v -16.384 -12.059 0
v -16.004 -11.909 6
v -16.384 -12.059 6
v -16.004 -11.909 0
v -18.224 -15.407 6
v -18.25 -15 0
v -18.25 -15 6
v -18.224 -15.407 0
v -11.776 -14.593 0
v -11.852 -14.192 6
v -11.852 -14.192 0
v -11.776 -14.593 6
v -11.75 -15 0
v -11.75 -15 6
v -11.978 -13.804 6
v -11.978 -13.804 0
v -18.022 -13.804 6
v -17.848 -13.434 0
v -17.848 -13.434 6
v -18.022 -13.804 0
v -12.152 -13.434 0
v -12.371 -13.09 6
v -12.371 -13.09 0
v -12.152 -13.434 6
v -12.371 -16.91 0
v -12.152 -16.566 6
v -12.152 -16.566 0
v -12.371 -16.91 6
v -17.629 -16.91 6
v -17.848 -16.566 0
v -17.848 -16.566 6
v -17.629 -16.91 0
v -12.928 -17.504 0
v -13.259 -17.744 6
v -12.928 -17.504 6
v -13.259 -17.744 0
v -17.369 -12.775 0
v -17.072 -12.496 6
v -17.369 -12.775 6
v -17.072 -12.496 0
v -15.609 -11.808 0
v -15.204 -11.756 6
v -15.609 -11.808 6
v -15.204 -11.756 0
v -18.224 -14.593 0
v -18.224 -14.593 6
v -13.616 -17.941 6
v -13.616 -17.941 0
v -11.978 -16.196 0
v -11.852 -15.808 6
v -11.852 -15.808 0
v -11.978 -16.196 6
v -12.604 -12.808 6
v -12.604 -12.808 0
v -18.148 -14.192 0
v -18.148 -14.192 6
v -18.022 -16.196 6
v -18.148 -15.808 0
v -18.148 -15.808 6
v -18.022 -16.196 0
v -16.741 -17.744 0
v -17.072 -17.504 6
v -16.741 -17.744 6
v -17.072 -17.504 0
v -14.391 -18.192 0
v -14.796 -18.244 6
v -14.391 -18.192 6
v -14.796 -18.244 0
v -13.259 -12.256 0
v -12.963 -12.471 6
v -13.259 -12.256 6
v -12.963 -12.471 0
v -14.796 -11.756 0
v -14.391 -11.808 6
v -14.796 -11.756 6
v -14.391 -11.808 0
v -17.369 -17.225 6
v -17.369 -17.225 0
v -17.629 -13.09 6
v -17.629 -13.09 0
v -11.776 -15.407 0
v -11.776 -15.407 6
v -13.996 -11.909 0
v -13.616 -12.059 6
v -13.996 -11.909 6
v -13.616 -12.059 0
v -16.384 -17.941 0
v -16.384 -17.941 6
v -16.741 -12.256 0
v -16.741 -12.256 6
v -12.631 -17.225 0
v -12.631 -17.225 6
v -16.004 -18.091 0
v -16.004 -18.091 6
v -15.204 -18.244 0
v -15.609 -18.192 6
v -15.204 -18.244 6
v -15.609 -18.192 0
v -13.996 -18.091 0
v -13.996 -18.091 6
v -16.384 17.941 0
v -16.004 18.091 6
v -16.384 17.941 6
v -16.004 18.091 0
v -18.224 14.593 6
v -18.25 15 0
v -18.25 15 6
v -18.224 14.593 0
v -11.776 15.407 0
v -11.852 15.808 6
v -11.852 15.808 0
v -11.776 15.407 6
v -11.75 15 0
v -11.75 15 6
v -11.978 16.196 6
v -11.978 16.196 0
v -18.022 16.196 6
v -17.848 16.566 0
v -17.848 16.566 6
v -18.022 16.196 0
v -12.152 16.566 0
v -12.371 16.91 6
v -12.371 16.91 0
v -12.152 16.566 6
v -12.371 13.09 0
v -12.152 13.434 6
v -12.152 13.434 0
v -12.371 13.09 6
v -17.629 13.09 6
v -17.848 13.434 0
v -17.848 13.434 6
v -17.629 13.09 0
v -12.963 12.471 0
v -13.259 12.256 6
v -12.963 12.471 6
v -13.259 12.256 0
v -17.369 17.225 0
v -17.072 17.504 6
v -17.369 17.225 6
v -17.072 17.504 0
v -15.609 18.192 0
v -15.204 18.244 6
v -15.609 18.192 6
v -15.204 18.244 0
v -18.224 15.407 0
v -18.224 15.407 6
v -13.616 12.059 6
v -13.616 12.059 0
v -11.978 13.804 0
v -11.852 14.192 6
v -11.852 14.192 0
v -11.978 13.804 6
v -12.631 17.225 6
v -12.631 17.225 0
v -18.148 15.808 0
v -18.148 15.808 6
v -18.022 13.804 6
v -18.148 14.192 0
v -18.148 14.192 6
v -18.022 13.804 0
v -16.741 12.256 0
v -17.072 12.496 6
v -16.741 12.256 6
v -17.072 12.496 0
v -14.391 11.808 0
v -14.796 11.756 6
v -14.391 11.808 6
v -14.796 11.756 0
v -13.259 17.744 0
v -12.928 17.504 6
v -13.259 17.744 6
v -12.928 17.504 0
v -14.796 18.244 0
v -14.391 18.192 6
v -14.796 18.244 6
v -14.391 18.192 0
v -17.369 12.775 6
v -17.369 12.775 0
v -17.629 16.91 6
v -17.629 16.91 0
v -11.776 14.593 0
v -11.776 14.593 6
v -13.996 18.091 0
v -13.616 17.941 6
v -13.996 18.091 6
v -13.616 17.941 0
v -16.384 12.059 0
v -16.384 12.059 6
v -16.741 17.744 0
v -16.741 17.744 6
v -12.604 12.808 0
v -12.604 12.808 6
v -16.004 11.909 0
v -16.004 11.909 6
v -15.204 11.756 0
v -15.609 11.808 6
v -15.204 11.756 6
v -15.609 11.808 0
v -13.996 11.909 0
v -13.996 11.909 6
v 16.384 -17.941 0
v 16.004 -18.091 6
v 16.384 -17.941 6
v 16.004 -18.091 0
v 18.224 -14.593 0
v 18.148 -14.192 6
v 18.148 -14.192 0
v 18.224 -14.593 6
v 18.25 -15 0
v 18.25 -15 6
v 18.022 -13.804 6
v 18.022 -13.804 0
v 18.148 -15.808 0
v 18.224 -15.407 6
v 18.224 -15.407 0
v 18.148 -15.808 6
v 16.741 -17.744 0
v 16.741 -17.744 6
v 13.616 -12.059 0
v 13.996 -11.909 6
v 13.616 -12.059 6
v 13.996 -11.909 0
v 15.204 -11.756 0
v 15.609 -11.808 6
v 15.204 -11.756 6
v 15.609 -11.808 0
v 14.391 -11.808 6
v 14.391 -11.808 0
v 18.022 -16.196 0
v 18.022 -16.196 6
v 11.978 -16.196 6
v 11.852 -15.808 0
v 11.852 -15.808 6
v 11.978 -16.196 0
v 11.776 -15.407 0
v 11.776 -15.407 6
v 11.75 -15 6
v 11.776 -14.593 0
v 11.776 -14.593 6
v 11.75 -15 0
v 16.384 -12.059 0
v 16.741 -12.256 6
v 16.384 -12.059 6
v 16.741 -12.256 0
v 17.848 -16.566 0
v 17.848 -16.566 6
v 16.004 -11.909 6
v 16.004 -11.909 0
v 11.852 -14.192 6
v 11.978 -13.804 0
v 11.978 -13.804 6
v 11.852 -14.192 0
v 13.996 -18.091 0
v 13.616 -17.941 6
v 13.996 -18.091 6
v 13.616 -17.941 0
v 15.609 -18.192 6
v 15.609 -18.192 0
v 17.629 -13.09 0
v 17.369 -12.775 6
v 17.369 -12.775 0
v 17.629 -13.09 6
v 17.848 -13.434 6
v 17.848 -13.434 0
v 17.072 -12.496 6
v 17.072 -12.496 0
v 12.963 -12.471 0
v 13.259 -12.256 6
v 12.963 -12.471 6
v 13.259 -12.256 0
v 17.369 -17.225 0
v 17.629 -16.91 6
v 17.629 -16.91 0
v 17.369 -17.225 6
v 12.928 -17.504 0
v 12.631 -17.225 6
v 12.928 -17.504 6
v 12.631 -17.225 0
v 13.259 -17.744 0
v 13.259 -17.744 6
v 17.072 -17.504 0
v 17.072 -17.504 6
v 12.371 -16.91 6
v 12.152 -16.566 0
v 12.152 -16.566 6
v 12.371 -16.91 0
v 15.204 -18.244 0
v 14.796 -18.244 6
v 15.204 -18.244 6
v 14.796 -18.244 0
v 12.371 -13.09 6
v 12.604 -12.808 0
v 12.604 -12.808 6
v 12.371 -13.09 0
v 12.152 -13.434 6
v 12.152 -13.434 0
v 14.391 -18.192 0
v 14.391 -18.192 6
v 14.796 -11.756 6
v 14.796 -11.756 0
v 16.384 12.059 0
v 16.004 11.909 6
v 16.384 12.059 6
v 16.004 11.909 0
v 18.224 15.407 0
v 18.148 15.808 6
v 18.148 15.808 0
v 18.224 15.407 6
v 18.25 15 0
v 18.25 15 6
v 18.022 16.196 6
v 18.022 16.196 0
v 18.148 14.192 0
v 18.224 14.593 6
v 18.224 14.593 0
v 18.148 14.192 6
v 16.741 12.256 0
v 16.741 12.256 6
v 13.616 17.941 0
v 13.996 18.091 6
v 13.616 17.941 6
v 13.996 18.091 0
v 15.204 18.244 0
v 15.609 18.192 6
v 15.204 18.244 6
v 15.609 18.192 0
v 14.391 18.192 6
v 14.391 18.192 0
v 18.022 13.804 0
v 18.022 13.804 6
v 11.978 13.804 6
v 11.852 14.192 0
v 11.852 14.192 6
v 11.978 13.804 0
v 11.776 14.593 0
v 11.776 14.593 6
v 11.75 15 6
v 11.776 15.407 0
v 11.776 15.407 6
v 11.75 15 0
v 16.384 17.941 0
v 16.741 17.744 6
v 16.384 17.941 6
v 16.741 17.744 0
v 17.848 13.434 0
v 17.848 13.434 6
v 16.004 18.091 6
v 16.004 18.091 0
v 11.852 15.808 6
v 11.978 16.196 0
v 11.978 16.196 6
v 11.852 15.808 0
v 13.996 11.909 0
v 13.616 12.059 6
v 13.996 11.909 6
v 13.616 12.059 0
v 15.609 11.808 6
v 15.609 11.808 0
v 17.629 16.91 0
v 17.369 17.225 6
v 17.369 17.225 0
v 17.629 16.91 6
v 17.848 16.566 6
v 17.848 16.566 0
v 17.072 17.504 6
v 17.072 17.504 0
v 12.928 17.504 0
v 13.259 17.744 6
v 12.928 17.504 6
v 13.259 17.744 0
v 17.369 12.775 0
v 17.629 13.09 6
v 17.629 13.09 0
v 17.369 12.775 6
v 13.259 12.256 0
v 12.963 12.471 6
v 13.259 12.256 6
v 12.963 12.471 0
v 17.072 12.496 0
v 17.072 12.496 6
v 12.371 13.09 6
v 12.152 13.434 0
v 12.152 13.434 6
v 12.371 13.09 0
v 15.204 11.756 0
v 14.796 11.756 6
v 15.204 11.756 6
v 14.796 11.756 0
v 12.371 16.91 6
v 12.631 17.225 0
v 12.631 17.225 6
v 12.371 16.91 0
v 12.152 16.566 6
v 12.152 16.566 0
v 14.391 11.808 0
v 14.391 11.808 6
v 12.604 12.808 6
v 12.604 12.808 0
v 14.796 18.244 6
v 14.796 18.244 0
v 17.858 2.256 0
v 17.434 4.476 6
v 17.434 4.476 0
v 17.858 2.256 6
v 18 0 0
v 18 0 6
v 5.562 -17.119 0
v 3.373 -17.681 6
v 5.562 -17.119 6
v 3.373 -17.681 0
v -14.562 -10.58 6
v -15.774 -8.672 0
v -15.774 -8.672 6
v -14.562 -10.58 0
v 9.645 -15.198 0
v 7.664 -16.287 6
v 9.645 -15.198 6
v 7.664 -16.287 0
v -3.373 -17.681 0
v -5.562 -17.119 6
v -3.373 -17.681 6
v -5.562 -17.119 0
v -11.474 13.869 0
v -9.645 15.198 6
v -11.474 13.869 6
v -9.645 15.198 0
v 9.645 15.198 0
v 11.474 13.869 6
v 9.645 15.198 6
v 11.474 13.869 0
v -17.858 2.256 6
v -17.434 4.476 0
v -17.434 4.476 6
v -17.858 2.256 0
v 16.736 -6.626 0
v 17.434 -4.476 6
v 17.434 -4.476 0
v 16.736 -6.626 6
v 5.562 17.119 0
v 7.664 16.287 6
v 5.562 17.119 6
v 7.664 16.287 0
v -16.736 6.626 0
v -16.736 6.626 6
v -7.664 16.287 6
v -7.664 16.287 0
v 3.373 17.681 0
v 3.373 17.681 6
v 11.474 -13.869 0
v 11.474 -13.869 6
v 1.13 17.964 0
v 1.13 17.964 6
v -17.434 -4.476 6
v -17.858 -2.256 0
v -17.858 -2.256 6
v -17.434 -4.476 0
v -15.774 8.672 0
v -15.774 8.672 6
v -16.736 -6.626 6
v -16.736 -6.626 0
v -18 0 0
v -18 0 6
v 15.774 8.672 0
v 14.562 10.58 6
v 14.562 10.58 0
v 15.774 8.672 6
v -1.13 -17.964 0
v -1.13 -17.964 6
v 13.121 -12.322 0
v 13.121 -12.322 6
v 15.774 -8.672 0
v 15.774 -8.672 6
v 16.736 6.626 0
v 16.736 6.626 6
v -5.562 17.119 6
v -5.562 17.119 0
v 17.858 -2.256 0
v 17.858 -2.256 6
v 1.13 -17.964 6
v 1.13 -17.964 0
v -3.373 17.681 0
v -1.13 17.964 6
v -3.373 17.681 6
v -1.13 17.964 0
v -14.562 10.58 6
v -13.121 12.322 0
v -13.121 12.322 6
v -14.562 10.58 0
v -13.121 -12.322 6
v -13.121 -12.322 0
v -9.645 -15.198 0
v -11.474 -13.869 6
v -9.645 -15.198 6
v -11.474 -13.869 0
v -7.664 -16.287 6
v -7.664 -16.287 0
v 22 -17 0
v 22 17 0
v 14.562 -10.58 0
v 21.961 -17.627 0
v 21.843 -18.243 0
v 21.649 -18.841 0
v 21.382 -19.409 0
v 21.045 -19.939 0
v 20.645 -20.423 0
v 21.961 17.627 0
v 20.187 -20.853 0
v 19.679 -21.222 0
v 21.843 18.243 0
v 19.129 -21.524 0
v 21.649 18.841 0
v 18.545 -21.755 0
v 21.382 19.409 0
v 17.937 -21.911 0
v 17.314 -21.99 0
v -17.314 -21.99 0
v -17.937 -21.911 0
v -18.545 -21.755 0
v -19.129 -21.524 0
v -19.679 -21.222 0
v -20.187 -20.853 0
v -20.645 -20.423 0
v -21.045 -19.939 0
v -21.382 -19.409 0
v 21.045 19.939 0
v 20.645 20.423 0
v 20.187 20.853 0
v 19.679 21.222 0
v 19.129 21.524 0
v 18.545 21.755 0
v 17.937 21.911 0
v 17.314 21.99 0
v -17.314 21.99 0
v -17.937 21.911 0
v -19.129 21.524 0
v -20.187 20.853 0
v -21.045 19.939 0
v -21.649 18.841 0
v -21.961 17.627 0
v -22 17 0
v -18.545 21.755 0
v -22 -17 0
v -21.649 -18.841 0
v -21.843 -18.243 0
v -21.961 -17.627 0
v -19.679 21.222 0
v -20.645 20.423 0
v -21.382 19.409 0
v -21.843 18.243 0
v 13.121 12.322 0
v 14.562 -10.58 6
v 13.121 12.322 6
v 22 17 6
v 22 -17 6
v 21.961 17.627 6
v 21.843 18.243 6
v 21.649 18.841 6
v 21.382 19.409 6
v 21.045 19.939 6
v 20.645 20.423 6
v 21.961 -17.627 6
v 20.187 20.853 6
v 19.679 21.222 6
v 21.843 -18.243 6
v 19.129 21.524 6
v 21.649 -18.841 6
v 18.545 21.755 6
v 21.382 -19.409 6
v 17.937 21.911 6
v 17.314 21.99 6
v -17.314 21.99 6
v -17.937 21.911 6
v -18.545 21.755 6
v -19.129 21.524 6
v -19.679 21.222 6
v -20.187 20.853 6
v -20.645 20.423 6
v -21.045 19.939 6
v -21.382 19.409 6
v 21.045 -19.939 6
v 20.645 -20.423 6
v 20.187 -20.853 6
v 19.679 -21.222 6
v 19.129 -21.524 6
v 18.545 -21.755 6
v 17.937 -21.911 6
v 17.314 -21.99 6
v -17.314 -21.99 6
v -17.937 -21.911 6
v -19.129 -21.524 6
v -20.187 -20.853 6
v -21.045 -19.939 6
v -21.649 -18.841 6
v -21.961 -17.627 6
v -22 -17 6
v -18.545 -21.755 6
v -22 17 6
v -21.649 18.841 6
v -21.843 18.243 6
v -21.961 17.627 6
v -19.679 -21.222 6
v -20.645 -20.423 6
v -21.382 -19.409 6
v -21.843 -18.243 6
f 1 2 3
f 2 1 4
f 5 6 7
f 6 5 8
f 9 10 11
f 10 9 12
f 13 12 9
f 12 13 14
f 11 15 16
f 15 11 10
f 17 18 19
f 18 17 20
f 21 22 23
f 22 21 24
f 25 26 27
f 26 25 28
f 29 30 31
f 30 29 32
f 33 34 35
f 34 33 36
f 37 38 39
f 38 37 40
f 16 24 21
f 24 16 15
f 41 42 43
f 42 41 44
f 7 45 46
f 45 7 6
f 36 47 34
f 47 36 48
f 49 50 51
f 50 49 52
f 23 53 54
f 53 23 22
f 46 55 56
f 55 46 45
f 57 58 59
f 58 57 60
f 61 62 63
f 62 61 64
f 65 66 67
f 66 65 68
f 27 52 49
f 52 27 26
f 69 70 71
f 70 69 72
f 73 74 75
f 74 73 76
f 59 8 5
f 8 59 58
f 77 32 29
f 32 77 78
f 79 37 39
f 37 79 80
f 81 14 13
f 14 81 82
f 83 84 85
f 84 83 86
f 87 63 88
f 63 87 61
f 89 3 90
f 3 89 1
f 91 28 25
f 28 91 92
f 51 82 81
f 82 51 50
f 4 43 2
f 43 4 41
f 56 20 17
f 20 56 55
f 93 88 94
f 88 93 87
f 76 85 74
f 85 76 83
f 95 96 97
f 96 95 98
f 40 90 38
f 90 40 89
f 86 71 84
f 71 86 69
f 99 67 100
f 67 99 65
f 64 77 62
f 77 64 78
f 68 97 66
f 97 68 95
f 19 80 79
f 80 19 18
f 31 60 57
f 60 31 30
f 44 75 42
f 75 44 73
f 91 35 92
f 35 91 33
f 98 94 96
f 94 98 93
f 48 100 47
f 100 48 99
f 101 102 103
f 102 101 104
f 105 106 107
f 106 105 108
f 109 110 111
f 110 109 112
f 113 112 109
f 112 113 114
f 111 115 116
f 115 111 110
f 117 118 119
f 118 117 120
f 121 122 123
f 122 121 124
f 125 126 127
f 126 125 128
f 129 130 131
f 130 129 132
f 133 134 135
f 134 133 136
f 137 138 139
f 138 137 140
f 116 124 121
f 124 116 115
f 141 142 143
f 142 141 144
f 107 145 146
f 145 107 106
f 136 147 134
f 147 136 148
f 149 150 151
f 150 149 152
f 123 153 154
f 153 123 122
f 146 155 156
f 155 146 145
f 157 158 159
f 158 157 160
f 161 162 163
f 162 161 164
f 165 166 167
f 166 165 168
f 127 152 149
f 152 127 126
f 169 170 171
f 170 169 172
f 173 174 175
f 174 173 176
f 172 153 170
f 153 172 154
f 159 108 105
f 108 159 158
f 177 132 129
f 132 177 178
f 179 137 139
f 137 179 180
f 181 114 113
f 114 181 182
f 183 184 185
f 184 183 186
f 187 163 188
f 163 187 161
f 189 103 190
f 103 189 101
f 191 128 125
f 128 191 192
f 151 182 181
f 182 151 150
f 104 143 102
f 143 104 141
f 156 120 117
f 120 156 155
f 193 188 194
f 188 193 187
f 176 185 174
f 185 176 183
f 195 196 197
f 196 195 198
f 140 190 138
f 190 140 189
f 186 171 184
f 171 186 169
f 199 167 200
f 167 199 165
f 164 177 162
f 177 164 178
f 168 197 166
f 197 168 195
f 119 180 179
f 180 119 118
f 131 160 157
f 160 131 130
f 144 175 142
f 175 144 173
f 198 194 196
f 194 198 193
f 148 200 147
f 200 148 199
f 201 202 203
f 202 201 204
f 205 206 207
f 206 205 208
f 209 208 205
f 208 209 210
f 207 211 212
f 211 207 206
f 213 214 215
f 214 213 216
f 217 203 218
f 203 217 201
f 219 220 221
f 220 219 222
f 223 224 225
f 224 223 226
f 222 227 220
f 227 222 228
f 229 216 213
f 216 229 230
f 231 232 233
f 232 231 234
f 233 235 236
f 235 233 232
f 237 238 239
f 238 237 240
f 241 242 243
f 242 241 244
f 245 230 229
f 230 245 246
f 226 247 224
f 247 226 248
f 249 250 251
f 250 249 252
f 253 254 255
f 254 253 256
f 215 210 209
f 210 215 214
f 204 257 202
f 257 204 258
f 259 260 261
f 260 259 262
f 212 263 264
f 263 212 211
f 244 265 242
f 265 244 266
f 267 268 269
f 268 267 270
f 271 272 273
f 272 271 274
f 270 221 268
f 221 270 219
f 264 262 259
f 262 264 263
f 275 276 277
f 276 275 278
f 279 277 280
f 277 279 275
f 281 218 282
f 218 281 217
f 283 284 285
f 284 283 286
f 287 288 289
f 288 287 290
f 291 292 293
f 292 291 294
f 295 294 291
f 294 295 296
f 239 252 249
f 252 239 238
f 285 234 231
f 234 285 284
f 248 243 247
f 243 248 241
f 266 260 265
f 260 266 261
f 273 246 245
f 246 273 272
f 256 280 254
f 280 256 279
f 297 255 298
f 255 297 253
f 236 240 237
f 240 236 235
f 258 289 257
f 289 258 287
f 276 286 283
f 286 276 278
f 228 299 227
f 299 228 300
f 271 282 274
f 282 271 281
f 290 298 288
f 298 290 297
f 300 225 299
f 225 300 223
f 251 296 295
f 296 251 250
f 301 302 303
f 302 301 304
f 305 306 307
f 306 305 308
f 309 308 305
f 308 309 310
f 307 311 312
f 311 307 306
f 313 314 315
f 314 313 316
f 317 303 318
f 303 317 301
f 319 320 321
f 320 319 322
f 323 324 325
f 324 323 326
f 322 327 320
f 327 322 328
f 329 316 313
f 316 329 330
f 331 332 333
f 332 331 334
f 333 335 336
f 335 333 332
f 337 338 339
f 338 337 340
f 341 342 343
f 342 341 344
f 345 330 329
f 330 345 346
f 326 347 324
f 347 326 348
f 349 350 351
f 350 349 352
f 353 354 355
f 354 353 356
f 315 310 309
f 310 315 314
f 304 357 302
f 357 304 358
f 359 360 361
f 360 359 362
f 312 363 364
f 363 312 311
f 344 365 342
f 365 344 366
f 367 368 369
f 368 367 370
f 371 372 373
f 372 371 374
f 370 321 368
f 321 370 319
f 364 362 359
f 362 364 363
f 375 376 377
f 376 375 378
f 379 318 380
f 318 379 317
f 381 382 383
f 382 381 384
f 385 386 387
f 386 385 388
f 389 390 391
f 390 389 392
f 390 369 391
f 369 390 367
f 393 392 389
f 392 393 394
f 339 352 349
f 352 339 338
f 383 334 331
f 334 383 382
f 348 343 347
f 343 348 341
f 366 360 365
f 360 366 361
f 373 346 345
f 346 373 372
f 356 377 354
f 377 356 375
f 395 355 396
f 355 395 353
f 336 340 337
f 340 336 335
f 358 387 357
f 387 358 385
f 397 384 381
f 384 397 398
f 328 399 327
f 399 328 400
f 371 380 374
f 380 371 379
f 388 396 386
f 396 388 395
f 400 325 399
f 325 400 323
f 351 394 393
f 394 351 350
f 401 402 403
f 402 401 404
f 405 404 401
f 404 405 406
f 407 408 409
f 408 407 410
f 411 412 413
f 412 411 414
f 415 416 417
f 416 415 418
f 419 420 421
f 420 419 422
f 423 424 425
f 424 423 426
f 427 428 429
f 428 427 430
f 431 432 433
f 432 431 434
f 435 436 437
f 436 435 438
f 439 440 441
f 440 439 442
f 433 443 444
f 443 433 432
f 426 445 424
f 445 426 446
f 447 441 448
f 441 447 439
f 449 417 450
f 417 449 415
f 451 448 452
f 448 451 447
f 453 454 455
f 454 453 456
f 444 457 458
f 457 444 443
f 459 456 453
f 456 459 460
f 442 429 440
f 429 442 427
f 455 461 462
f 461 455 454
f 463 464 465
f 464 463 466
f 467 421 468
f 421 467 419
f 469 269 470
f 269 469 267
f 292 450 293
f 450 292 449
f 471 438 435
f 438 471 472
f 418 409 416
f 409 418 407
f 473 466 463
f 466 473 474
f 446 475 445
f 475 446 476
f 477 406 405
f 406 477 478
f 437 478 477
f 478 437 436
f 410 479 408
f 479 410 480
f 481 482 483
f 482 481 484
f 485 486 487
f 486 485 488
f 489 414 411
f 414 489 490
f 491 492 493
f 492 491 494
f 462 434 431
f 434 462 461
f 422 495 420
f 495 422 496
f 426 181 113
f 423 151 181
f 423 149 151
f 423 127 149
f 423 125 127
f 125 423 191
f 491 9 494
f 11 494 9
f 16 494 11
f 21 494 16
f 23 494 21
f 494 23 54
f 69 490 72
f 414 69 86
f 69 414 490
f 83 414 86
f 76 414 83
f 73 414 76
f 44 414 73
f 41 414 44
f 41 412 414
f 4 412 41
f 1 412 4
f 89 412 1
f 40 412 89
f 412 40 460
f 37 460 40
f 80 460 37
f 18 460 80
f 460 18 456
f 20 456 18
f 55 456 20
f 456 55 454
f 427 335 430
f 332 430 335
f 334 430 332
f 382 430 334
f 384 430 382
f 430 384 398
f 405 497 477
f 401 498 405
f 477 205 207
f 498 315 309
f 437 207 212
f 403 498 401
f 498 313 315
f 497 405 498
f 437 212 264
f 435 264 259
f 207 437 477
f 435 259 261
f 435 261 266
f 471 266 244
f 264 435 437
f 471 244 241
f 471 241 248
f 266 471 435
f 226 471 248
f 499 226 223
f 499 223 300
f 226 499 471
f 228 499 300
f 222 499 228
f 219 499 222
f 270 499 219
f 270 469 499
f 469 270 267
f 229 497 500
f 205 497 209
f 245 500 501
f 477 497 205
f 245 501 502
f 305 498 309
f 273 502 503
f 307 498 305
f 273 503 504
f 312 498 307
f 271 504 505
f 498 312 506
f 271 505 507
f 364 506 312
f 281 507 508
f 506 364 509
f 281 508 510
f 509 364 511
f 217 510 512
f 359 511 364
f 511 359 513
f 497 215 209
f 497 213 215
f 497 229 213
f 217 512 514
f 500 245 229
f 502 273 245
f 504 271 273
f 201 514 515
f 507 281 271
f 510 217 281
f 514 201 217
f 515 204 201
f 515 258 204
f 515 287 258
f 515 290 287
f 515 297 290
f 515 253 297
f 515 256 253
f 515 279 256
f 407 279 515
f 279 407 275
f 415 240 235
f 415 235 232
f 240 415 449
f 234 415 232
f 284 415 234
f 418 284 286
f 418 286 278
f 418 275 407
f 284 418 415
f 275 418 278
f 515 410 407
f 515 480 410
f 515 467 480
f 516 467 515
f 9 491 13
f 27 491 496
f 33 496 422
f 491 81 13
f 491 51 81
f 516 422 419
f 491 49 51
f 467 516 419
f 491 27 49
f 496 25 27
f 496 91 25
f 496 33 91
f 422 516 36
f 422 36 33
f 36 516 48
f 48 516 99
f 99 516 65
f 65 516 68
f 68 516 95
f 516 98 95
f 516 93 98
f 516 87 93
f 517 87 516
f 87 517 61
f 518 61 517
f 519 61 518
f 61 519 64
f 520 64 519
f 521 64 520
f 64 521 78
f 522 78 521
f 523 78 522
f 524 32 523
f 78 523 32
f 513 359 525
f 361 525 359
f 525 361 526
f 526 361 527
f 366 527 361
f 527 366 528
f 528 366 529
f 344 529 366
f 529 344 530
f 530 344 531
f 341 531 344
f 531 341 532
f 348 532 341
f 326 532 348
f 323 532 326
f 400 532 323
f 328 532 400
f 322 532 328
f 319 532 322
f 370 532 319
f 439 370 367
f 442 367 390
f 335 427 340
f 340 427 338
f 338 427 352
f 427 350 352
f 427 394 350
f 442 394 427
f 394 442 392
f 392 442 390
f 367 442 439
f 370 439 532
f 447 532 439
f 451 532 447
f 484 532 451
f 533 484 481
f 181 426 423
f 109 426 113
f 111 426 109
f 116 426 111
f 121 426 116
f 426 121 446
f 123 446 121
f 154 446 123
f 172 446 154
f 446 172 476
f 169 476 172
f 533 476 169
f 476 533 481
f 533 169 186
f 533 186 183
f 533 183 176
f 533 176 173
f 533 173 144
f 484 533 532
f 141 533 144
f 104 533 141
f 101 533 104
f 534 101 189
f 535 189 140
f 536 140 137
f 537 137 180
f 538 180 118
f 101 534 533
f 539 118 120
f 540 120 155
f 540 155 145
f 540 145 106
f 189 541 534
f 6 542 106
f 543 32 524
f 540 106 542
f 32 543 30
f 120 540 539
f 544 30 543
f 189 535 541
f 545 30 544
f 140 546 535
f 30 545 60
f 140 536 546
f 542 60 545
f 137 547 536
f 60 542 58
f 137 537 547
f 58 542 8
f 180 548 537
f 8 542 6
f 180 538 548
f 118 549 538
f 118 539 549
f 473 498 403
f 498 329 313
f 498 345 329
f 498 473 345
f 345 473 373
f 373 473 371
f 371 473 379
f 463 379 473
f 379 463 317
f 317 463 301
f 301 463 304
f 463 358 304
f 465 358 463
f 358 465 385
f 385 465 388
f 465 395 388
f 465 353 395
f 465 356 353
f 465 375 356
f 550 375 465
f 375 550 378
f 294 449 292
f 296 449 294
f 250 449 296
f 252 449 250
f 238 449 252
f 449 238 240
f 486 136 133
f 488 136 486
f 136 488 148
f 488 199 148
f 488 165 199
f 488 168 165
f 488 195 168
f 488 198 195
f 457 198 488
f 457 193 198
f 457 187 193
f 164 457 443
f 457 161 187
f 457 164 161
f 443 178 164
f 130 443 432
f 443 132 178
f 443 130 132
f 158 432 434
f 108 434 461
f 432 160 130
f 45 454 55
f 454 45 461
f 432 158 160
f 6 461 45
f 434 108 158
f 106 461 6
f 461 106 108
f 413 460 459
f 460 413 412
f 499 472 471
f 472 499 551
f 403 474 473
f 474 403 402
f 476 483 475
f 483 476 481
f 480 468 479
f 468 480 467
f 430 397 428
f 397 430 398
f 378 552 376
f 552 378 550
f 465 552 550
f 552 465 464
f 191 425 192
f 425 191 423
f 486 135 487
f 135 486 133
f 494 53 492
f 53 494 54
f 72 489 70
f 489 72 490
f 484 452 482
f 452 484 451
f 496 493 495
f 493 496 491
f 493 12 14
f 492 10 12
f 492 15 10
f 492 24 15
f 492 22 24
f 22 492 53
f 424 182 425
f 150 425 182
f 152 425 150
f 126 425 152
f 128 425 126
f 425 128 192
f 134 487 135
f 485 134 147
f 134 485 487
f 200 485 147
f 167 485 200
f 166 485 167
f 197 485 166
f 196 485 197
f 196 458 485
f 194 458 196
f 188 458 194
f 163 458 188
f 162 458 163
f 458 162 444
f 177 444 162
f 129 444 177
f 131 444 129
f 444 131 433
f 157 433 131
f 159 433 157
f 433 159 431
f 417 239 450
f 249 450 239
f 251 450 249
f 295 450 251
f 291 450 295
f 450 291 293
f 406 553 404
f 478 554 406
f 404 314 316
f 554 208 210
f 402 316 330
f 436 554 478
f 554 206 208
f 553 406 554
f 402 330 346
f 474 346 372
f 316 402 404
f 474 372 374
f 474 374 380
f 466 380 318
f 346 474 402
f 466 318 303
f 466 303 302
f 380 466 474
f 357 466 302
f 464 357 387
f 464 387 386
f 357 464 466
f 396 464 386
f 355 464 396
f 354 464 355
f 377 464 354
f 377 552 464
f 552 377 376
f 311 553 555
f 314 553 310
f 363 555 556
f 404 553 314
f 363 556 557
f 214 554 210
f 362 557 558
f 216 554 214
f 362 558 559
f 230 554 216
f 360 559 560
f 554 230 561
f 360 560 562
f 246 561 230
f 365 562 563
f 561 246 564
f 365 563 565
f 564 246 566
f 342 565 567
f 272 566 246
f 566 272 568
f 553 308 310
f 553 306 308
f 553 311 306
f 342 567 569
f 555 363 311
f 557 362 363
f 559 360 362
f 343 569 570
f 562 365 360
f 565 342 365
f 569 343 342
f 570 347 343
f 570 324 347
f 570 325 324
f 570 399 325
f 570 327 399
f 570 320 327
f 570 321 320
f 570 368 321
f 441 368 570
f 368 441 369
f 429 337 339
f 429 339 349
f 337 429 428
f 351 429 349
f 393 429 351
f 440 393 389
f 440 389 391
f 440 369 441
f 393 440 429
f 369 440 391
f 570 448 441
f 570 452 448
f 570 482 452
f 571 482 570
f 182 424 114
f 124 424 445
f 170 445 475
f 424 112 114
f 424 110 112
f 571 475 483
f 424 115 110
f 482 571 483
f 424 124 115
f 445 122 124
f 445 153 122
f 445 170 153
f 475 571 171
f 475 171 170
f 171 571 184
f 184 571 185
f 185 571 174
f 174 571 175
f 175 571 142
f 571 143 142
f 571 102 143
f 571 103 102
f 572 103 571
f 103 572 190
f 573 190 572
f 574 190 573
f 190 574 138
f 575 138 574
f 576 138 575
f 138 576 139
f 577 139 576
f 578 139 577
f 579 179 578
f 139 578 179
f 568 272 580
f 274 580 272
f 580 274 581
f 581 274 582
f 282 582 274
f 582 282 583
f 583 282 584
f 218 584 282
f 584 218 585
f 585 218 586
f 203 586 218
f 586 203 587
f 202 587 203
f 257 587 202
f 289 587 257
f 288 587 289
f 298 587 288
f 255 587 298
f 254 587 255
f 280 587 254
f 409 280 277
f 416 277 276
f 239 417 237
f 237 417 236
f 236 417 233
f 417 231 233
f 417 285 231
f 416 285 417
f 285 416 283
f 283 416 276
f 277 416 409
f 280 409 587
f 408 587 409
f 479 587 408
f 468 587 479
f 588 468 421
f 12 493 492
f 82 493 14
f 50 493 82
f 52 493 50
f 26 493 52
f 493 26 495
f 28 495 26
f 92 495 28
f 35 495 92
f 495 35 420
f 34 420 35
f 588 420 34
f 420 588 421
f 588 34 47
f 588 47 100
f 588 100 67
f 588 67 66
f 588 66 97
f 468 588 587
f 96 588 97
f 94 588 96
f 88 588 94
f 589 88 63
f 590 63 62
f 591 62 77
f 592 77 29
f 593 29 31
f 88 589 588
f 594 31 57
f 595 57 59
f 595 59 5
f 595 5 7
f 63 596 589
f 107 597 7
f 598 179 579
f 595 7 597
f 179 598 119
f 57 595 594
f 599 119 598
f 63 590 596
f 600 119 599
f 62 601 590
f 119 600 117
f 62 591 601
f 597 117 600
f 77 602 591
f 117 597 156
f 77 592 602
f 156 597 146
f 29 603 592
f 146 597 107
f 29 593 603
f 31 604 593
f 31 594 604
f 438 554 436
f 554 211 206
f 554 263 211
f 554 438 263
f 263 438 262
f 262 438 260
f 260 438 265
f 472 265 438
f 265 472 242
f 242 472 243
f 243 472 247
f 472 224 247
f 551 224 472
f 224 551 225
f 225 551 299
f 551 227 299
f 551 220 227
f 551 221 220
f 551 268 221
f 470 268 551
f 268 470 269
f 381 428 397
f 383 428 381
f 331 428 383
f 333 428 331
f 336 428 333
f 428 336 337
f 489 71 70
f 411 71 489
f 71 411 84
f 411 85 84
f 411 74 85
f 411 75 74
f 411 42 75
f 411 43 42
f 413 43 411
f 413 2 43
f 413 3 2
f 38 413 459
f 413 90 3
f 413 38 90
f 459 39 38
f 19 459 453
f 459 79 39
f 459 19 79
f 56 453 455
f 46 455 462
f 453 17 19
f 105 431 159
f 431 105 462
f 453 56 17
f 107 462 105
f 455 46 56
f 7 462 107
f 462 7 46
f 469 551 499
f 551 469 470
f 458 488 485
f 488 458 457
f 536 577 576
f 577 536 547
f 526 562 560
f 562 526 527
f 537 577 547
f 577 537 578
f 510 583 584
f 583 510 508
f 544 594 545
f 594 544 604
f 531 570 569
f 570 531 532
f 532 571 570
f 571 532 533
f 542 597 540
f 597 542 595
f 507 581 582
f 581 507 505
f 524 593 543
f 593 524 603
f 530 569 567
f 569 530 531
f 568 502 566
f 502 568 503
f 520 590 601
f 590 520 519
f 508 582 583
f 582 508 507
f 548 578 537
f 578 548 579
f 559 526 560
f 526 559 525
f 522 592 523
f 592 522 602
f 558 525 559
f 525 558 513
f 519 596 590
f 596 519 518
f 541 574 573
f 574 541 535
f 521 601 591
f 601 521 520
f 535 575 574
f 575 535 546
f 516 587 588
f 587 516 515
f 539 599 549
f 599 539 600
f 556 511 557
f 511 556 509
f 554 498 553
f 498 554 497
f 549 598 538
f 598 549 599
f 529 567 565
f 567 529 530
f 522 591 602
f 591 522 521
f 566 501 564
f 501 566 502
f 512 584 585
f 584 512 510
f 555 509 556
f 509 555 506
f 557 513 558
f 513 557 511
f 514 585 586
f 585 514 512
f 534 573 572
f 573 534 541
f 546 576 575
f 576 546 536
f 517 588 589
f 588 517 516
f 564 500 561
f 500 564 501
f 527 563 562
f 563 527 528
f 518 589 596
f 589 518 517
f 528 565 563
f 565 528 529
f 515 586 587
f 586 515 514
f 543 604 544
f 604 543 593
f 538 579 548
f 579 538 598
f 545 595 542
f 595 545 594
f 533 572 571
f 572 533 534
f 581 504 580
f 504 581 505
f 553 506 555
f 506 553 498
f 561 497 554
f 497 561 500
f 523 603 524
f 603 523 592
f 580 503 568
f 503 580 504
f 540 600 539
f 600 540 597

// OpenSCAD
$fn = 50;


difference() {
	union() {
		hull() {
			translate(v = [-17.0000000000, 17.0000000000, 0]) {
				cylinder(h = 6, r = 5);
			}
			translate(v = [17.0000000000, 17.0000000000, 0]) {
				cylinder(h = 6, r = 5);
			}
			translate(v = [-17.0000000000, -17.0000000000, 0]) {
				cylinder(h = 6, r = 5);
			}
			translate(v = [17.0000000000, -17.0000000000, 0]) {
				cylinder(h = 6, r = 5);
			}
		}
	}
	union() {
		#translate(v = [-15.0000000000, -15.0000000000, -100.0000000000]) {
			cylinder(h = 200, r = 3.2500000000);
		}
		#translate(v = [-15.0000000000, 15.0000000000, -100.0000000000]) {
			cylinder(h = 200, r = 3.2500000000);
		}
		#translate(v = [15.0000000000, -15.0000000000, -100.0000000000]) {
			cylinder(h = 200, r = 3.2500000000);
		}
		#translate(v = [15.0000000000, 15.0000000000, -100.0000000000]) {
			cylinder(h = 200, r = 3.2500000000);
		}
		#cylinder(h = 6, r = 18.0000000000);
	}
}
